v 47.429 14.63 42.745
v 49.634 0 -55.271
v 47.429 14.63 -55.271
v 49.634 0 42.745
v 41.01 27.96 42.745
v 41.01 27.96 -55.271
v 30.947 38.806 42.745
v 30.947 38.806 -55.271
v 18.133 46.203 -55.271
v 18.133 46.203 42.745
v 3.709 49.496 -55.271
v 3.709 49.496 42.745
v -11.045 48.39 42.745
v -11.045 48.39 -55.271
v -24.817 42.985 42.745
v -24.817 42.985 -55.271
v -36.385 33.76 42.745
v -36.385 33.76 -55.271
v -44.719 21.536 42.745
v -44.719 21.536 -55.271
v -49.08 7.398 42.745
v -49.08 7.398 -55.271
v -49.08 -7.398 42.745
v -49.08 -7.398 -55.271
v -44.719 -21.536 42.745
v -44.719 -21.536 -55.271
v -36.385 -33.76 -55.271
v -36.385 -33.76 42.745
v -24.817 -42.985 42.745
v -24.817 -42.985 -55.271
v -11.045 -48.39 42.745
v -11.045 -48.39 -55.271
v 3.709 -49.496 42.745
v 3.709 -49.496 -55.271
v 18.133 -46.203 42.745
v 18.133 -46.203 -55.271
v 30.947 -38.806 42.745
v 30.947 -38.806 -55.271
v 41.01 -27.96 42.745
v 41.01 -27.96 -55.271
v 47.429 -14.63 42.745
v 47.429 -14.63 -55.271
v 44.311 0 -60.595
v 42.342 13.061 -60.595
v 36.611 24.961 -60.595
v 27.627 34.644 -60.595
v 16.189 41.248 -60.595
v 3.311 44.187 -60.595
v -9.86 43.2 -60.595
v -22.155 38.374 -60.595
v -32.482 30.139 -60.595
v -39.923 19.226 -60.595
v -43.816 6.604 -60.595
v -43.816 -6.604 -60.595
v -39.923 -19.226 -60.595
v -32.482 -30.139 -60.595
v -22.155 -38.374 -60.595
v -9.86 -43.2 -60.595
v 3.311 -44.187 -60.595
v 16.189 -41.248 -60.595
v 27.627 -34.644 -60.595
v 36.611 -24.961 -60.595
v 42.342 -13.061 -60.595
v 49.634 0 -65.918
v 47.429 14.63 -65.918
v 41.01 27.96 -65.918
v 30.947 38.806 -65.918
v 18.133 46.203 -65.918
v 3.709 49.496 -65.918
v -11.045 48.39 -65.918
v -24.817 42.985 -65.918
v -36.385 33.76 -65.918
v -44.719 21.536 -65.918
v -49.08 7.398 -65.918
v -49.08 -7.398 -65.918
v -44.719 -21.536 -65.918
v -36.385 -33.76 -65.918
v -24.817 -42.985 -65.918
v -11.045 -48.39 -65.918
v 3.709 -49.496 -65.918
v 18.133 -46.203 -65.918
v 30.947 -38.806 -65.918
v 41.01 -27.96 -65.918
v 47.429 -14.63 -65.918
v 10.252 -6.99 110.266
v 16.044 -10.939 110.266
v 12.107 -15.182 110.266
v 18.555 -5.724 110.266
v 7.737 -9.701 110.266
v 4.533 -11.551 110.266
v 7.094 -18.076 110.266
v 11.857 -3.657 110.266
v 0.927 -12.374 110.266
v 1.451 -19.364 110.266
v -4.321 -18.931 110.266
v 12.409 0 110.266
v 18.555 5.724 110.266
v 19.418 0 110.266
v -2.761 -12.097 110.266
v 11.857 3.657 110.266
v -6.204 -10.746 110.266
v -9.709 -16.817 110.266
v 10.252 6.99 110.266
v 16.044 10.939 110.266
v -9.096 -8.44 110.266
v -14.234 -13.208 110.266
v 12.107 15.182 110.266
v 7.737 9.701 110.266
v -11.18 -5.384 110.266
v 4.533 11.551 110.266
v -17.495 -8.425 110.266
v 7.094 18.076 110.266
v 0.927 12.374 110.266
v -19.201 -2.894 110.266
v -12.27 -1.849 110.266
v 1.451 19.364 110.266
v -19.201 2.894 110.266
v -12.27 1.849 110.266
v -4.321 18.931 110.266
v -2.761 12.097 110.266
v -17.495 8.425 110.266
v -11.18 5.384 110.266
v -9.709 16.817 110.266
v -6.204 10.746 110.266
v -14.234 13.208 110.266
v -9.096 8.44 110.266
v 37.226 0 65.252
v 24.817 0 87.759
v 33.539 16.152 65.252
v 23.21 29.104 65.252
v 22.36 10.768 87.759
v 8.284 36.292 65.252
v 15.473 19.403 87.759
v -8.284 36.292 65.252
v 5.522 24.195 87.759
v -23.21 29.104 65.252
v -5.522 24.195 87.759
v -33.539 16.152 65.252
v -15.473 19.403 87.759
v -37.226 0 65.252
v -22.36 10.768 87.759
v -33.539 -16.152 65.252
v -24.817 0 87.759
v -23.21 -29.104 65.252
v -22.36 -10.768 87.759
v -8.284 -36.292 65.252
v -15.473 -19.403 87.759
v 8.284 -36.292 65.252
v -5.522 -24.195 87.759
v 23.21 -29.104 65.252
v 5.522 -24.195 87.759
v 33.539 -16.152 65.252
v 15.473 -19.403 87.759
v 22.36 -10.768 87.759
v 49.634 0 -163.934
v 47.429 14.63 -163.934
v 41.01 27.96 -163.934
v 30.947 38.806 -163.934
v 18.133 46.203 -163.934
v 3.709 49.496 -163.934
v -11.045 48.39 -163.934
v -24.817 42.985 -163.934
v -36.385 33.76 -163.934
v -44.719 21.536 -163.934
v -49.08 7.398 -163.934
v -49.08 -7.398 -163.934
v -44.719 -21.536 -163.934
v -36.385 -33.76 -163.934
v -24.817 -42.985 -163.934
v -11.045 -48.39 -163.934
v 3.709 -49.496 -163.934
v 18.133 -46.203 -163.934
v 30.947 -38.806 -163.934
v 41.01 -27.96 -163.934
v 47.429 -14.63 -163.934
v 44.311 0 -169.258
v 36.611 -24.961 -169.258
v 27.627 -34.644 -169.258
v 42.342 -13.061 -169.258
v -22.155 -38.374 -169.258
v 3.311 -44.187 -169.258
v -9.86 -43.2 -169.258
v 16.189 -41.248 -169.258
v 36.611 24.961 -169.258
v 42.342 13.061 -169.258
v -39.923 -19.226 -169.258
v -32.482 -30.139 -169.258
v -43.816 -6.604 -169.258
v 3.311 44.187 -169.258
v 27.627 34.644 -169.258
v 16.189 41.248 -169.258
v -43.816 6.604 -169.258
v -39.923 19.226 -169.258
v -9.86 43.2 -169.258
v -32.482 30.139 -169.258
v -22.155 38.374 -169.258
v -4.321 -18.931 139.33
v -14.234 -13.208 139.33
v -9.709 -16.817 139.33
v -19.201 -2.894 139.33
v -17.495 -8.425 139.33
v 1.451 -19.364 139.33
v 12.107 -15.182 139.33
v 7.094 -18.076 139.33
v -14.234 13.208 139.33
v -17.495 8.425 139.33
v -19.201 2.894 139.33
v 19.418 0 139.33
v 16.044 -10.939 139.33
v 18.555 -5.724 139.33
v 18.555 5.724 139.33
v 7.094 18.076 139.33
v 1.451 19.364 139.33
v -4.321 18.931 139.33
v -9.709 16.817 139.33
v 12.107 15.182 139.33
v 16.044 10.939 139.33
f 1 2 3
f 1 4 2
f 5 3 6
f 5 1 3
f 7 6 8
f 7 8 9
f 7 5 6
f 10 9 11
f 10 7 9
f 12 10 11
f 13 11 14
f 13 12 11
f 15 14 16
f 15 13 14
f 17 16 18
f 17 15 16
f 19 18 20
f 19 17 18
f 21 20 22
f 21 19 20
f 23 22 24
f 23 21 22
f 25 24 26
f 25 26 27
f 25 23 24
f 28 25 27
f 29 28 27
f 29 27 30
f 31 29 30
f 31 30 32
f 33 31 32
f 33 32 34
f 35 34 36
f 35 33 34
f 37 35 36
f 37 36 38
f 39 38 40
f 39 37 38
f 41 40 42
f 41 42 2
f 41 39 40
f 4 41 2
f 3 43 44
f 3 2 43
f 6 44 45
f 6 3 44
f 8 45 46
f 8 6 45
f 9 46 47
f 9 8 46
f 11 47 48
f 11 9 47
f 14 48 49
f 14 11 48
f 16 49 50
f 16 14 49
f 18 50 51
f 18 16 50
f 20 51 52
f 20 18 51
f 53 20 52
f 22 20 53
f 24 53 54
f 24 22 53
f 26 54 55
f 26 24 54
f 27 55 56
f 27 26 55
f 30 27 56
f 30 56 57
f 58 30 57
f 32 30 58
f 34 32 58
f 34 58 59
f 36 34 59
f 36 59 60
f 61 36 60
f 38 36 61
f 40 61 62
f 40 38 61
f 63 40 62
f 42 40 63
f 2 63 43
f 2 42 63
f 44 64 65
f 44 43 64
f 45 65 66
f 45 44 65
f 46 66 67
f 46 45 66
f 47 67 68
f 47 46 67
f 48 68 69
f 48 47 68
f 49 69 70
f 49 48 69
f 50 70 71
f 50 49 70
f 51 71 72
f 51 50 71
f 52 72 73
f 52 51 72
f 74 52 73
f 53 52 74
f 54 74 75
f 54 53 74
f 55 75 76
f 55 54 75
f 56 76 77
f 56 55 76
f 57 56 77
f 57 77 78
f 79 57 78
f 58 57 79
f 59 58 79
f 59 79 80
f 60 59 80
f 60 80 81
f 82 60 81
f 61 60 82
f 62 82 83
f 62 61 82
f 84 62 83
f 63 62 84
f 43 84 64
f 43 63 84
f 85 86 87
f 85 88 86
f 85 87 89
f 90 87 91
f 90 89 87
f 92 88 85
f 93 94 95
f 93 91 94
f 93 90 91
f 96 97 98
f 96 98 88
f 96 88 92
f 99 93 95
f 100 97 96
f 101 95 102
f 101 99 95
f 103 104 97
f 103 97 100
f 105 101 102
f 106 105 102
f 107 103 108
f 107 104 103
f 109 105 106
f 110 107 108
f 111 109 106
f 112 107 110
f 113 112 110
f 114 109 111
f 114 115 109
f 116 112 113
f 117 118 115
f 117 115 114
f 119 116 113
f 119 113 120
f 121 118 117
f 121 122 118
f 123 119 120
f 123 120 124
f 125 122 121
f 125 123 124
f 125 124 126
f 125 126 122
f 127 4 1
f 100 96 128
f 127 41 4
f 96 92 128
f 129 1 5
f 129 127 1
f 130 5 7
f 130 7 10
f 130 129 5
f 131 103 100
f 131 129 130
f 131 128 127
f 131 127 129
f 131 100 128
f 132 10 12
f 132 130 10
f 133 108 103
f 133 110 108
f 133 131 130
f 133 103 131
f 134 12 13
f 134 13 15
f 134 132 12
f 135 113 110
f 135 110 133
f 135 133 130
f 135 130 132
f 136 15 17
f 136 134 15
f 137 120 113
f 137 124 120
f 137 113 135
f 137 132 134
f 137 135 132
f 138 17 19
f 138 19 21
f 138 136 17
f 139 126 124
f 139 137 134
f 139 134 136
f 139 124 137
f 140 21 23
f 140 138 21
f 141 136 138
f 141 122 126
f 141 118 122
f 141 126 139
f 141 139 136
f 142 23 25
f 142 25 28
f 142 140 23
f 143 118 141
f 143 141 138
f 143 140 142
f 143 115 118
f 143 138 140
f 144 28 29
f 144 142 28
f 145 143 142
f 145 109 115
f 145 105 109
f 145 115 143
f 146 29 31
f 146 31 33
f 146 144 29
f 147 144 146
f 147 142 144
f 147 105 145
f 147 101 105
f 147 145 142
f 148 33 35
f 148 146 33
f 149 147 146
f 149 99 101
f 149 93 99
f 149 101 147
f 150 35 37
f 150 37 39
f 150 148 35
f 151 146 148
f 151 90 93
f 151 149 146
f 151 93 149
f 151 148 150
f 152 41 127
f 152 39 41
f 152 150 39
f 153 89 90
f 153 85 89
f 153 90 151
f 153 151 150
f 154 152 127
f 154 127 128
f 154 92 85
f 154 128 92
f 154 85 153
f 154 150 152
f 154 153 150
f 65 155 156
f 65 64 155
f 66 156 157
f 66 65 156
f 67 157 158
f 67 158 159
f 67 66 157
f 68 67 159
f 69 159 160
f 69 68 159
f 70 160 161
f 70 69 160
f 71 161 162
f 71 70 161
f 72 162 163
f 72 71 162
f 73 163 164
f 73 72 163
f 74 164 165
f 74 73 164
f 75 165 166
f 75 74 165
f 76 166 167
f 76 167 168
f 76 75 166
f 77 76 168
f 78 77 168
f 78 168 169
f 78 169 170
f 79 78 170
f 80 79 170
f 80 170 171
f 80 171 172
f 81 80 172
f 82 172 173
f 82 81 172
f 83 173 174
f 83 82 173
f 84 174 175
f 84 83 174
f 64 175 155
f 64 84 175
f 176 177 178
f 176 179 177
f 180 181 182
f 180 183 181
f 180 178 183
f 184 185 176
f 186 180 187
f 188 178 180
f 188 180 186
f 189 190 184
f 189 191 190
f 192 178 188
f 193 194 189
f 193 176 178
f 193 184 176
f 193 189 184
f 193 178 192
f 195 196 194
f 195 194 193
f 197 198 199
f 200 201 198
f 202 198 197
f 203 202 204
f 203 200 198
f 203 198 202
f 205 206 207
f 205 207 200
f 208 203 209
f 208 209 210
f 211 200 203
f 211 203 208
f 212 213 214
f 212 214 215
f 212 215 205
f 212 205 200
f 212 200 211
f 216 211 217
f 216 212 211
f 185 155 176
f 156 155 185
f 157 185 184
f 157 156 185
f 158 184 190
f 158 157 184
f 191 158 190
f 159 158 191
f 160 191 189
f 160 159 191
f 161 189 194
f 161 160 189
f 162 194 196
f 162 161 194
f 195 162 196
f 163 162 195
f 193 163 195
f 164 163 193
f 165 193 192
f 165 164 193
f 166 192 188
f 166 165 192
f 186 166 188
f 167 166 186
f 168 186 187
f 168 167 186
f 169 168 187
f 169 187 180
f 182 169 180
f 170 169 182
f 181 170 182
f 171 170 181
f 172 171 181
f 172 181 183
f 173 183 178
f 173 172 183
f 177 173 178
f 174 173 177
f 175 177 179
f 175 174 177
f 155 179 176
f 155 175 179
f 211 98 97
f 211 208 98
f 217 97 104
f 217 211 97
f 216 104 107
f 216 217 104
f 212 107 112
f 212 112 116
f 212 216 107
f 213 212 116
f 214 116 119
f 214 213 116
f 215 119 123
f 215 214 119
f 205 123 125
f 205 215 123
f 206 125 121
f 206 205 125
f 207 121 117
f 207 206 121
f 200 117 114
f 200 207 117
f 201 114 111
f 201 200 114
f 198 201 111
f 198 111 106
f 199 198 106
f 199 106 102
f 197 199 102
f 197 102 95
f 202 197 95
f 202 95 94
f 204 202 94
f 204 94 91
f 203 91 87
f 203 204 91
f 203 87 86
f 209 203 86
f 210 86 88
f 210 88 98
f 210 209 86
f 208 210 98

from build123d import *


with BuildPart() as f1:
    # F0 (on Front) → F1 (revolve)
    with BuildSketch(Plane.XZ):
        Polygon((49.634386, 42.745069), (0, 42.745069), (0, -110.233098), (0, -169.257939), (22.155412, -169.257939), (44.310823, -169.257939), (49.634386, -163.93438), (49.634386, -114.926297), (49.634386, -65.918215), (44.310823, -60.594656), (49.634386, -55.271097), align=None)
        Polygon((0, 110.266026), (0, 42.745069), (49.634386, 42.745069), (12.408596, 110.266026), align=None)
        Polygon((0, 139.329761), (0, 110.266026), (12.408596, 110.266026), (19.418076, 110.266026), (19.418076, 139.329761), align=None)
    revolve(axis=Axis((0, 0, -139.745519), (0, 0, 1)))


solid = f1.part
